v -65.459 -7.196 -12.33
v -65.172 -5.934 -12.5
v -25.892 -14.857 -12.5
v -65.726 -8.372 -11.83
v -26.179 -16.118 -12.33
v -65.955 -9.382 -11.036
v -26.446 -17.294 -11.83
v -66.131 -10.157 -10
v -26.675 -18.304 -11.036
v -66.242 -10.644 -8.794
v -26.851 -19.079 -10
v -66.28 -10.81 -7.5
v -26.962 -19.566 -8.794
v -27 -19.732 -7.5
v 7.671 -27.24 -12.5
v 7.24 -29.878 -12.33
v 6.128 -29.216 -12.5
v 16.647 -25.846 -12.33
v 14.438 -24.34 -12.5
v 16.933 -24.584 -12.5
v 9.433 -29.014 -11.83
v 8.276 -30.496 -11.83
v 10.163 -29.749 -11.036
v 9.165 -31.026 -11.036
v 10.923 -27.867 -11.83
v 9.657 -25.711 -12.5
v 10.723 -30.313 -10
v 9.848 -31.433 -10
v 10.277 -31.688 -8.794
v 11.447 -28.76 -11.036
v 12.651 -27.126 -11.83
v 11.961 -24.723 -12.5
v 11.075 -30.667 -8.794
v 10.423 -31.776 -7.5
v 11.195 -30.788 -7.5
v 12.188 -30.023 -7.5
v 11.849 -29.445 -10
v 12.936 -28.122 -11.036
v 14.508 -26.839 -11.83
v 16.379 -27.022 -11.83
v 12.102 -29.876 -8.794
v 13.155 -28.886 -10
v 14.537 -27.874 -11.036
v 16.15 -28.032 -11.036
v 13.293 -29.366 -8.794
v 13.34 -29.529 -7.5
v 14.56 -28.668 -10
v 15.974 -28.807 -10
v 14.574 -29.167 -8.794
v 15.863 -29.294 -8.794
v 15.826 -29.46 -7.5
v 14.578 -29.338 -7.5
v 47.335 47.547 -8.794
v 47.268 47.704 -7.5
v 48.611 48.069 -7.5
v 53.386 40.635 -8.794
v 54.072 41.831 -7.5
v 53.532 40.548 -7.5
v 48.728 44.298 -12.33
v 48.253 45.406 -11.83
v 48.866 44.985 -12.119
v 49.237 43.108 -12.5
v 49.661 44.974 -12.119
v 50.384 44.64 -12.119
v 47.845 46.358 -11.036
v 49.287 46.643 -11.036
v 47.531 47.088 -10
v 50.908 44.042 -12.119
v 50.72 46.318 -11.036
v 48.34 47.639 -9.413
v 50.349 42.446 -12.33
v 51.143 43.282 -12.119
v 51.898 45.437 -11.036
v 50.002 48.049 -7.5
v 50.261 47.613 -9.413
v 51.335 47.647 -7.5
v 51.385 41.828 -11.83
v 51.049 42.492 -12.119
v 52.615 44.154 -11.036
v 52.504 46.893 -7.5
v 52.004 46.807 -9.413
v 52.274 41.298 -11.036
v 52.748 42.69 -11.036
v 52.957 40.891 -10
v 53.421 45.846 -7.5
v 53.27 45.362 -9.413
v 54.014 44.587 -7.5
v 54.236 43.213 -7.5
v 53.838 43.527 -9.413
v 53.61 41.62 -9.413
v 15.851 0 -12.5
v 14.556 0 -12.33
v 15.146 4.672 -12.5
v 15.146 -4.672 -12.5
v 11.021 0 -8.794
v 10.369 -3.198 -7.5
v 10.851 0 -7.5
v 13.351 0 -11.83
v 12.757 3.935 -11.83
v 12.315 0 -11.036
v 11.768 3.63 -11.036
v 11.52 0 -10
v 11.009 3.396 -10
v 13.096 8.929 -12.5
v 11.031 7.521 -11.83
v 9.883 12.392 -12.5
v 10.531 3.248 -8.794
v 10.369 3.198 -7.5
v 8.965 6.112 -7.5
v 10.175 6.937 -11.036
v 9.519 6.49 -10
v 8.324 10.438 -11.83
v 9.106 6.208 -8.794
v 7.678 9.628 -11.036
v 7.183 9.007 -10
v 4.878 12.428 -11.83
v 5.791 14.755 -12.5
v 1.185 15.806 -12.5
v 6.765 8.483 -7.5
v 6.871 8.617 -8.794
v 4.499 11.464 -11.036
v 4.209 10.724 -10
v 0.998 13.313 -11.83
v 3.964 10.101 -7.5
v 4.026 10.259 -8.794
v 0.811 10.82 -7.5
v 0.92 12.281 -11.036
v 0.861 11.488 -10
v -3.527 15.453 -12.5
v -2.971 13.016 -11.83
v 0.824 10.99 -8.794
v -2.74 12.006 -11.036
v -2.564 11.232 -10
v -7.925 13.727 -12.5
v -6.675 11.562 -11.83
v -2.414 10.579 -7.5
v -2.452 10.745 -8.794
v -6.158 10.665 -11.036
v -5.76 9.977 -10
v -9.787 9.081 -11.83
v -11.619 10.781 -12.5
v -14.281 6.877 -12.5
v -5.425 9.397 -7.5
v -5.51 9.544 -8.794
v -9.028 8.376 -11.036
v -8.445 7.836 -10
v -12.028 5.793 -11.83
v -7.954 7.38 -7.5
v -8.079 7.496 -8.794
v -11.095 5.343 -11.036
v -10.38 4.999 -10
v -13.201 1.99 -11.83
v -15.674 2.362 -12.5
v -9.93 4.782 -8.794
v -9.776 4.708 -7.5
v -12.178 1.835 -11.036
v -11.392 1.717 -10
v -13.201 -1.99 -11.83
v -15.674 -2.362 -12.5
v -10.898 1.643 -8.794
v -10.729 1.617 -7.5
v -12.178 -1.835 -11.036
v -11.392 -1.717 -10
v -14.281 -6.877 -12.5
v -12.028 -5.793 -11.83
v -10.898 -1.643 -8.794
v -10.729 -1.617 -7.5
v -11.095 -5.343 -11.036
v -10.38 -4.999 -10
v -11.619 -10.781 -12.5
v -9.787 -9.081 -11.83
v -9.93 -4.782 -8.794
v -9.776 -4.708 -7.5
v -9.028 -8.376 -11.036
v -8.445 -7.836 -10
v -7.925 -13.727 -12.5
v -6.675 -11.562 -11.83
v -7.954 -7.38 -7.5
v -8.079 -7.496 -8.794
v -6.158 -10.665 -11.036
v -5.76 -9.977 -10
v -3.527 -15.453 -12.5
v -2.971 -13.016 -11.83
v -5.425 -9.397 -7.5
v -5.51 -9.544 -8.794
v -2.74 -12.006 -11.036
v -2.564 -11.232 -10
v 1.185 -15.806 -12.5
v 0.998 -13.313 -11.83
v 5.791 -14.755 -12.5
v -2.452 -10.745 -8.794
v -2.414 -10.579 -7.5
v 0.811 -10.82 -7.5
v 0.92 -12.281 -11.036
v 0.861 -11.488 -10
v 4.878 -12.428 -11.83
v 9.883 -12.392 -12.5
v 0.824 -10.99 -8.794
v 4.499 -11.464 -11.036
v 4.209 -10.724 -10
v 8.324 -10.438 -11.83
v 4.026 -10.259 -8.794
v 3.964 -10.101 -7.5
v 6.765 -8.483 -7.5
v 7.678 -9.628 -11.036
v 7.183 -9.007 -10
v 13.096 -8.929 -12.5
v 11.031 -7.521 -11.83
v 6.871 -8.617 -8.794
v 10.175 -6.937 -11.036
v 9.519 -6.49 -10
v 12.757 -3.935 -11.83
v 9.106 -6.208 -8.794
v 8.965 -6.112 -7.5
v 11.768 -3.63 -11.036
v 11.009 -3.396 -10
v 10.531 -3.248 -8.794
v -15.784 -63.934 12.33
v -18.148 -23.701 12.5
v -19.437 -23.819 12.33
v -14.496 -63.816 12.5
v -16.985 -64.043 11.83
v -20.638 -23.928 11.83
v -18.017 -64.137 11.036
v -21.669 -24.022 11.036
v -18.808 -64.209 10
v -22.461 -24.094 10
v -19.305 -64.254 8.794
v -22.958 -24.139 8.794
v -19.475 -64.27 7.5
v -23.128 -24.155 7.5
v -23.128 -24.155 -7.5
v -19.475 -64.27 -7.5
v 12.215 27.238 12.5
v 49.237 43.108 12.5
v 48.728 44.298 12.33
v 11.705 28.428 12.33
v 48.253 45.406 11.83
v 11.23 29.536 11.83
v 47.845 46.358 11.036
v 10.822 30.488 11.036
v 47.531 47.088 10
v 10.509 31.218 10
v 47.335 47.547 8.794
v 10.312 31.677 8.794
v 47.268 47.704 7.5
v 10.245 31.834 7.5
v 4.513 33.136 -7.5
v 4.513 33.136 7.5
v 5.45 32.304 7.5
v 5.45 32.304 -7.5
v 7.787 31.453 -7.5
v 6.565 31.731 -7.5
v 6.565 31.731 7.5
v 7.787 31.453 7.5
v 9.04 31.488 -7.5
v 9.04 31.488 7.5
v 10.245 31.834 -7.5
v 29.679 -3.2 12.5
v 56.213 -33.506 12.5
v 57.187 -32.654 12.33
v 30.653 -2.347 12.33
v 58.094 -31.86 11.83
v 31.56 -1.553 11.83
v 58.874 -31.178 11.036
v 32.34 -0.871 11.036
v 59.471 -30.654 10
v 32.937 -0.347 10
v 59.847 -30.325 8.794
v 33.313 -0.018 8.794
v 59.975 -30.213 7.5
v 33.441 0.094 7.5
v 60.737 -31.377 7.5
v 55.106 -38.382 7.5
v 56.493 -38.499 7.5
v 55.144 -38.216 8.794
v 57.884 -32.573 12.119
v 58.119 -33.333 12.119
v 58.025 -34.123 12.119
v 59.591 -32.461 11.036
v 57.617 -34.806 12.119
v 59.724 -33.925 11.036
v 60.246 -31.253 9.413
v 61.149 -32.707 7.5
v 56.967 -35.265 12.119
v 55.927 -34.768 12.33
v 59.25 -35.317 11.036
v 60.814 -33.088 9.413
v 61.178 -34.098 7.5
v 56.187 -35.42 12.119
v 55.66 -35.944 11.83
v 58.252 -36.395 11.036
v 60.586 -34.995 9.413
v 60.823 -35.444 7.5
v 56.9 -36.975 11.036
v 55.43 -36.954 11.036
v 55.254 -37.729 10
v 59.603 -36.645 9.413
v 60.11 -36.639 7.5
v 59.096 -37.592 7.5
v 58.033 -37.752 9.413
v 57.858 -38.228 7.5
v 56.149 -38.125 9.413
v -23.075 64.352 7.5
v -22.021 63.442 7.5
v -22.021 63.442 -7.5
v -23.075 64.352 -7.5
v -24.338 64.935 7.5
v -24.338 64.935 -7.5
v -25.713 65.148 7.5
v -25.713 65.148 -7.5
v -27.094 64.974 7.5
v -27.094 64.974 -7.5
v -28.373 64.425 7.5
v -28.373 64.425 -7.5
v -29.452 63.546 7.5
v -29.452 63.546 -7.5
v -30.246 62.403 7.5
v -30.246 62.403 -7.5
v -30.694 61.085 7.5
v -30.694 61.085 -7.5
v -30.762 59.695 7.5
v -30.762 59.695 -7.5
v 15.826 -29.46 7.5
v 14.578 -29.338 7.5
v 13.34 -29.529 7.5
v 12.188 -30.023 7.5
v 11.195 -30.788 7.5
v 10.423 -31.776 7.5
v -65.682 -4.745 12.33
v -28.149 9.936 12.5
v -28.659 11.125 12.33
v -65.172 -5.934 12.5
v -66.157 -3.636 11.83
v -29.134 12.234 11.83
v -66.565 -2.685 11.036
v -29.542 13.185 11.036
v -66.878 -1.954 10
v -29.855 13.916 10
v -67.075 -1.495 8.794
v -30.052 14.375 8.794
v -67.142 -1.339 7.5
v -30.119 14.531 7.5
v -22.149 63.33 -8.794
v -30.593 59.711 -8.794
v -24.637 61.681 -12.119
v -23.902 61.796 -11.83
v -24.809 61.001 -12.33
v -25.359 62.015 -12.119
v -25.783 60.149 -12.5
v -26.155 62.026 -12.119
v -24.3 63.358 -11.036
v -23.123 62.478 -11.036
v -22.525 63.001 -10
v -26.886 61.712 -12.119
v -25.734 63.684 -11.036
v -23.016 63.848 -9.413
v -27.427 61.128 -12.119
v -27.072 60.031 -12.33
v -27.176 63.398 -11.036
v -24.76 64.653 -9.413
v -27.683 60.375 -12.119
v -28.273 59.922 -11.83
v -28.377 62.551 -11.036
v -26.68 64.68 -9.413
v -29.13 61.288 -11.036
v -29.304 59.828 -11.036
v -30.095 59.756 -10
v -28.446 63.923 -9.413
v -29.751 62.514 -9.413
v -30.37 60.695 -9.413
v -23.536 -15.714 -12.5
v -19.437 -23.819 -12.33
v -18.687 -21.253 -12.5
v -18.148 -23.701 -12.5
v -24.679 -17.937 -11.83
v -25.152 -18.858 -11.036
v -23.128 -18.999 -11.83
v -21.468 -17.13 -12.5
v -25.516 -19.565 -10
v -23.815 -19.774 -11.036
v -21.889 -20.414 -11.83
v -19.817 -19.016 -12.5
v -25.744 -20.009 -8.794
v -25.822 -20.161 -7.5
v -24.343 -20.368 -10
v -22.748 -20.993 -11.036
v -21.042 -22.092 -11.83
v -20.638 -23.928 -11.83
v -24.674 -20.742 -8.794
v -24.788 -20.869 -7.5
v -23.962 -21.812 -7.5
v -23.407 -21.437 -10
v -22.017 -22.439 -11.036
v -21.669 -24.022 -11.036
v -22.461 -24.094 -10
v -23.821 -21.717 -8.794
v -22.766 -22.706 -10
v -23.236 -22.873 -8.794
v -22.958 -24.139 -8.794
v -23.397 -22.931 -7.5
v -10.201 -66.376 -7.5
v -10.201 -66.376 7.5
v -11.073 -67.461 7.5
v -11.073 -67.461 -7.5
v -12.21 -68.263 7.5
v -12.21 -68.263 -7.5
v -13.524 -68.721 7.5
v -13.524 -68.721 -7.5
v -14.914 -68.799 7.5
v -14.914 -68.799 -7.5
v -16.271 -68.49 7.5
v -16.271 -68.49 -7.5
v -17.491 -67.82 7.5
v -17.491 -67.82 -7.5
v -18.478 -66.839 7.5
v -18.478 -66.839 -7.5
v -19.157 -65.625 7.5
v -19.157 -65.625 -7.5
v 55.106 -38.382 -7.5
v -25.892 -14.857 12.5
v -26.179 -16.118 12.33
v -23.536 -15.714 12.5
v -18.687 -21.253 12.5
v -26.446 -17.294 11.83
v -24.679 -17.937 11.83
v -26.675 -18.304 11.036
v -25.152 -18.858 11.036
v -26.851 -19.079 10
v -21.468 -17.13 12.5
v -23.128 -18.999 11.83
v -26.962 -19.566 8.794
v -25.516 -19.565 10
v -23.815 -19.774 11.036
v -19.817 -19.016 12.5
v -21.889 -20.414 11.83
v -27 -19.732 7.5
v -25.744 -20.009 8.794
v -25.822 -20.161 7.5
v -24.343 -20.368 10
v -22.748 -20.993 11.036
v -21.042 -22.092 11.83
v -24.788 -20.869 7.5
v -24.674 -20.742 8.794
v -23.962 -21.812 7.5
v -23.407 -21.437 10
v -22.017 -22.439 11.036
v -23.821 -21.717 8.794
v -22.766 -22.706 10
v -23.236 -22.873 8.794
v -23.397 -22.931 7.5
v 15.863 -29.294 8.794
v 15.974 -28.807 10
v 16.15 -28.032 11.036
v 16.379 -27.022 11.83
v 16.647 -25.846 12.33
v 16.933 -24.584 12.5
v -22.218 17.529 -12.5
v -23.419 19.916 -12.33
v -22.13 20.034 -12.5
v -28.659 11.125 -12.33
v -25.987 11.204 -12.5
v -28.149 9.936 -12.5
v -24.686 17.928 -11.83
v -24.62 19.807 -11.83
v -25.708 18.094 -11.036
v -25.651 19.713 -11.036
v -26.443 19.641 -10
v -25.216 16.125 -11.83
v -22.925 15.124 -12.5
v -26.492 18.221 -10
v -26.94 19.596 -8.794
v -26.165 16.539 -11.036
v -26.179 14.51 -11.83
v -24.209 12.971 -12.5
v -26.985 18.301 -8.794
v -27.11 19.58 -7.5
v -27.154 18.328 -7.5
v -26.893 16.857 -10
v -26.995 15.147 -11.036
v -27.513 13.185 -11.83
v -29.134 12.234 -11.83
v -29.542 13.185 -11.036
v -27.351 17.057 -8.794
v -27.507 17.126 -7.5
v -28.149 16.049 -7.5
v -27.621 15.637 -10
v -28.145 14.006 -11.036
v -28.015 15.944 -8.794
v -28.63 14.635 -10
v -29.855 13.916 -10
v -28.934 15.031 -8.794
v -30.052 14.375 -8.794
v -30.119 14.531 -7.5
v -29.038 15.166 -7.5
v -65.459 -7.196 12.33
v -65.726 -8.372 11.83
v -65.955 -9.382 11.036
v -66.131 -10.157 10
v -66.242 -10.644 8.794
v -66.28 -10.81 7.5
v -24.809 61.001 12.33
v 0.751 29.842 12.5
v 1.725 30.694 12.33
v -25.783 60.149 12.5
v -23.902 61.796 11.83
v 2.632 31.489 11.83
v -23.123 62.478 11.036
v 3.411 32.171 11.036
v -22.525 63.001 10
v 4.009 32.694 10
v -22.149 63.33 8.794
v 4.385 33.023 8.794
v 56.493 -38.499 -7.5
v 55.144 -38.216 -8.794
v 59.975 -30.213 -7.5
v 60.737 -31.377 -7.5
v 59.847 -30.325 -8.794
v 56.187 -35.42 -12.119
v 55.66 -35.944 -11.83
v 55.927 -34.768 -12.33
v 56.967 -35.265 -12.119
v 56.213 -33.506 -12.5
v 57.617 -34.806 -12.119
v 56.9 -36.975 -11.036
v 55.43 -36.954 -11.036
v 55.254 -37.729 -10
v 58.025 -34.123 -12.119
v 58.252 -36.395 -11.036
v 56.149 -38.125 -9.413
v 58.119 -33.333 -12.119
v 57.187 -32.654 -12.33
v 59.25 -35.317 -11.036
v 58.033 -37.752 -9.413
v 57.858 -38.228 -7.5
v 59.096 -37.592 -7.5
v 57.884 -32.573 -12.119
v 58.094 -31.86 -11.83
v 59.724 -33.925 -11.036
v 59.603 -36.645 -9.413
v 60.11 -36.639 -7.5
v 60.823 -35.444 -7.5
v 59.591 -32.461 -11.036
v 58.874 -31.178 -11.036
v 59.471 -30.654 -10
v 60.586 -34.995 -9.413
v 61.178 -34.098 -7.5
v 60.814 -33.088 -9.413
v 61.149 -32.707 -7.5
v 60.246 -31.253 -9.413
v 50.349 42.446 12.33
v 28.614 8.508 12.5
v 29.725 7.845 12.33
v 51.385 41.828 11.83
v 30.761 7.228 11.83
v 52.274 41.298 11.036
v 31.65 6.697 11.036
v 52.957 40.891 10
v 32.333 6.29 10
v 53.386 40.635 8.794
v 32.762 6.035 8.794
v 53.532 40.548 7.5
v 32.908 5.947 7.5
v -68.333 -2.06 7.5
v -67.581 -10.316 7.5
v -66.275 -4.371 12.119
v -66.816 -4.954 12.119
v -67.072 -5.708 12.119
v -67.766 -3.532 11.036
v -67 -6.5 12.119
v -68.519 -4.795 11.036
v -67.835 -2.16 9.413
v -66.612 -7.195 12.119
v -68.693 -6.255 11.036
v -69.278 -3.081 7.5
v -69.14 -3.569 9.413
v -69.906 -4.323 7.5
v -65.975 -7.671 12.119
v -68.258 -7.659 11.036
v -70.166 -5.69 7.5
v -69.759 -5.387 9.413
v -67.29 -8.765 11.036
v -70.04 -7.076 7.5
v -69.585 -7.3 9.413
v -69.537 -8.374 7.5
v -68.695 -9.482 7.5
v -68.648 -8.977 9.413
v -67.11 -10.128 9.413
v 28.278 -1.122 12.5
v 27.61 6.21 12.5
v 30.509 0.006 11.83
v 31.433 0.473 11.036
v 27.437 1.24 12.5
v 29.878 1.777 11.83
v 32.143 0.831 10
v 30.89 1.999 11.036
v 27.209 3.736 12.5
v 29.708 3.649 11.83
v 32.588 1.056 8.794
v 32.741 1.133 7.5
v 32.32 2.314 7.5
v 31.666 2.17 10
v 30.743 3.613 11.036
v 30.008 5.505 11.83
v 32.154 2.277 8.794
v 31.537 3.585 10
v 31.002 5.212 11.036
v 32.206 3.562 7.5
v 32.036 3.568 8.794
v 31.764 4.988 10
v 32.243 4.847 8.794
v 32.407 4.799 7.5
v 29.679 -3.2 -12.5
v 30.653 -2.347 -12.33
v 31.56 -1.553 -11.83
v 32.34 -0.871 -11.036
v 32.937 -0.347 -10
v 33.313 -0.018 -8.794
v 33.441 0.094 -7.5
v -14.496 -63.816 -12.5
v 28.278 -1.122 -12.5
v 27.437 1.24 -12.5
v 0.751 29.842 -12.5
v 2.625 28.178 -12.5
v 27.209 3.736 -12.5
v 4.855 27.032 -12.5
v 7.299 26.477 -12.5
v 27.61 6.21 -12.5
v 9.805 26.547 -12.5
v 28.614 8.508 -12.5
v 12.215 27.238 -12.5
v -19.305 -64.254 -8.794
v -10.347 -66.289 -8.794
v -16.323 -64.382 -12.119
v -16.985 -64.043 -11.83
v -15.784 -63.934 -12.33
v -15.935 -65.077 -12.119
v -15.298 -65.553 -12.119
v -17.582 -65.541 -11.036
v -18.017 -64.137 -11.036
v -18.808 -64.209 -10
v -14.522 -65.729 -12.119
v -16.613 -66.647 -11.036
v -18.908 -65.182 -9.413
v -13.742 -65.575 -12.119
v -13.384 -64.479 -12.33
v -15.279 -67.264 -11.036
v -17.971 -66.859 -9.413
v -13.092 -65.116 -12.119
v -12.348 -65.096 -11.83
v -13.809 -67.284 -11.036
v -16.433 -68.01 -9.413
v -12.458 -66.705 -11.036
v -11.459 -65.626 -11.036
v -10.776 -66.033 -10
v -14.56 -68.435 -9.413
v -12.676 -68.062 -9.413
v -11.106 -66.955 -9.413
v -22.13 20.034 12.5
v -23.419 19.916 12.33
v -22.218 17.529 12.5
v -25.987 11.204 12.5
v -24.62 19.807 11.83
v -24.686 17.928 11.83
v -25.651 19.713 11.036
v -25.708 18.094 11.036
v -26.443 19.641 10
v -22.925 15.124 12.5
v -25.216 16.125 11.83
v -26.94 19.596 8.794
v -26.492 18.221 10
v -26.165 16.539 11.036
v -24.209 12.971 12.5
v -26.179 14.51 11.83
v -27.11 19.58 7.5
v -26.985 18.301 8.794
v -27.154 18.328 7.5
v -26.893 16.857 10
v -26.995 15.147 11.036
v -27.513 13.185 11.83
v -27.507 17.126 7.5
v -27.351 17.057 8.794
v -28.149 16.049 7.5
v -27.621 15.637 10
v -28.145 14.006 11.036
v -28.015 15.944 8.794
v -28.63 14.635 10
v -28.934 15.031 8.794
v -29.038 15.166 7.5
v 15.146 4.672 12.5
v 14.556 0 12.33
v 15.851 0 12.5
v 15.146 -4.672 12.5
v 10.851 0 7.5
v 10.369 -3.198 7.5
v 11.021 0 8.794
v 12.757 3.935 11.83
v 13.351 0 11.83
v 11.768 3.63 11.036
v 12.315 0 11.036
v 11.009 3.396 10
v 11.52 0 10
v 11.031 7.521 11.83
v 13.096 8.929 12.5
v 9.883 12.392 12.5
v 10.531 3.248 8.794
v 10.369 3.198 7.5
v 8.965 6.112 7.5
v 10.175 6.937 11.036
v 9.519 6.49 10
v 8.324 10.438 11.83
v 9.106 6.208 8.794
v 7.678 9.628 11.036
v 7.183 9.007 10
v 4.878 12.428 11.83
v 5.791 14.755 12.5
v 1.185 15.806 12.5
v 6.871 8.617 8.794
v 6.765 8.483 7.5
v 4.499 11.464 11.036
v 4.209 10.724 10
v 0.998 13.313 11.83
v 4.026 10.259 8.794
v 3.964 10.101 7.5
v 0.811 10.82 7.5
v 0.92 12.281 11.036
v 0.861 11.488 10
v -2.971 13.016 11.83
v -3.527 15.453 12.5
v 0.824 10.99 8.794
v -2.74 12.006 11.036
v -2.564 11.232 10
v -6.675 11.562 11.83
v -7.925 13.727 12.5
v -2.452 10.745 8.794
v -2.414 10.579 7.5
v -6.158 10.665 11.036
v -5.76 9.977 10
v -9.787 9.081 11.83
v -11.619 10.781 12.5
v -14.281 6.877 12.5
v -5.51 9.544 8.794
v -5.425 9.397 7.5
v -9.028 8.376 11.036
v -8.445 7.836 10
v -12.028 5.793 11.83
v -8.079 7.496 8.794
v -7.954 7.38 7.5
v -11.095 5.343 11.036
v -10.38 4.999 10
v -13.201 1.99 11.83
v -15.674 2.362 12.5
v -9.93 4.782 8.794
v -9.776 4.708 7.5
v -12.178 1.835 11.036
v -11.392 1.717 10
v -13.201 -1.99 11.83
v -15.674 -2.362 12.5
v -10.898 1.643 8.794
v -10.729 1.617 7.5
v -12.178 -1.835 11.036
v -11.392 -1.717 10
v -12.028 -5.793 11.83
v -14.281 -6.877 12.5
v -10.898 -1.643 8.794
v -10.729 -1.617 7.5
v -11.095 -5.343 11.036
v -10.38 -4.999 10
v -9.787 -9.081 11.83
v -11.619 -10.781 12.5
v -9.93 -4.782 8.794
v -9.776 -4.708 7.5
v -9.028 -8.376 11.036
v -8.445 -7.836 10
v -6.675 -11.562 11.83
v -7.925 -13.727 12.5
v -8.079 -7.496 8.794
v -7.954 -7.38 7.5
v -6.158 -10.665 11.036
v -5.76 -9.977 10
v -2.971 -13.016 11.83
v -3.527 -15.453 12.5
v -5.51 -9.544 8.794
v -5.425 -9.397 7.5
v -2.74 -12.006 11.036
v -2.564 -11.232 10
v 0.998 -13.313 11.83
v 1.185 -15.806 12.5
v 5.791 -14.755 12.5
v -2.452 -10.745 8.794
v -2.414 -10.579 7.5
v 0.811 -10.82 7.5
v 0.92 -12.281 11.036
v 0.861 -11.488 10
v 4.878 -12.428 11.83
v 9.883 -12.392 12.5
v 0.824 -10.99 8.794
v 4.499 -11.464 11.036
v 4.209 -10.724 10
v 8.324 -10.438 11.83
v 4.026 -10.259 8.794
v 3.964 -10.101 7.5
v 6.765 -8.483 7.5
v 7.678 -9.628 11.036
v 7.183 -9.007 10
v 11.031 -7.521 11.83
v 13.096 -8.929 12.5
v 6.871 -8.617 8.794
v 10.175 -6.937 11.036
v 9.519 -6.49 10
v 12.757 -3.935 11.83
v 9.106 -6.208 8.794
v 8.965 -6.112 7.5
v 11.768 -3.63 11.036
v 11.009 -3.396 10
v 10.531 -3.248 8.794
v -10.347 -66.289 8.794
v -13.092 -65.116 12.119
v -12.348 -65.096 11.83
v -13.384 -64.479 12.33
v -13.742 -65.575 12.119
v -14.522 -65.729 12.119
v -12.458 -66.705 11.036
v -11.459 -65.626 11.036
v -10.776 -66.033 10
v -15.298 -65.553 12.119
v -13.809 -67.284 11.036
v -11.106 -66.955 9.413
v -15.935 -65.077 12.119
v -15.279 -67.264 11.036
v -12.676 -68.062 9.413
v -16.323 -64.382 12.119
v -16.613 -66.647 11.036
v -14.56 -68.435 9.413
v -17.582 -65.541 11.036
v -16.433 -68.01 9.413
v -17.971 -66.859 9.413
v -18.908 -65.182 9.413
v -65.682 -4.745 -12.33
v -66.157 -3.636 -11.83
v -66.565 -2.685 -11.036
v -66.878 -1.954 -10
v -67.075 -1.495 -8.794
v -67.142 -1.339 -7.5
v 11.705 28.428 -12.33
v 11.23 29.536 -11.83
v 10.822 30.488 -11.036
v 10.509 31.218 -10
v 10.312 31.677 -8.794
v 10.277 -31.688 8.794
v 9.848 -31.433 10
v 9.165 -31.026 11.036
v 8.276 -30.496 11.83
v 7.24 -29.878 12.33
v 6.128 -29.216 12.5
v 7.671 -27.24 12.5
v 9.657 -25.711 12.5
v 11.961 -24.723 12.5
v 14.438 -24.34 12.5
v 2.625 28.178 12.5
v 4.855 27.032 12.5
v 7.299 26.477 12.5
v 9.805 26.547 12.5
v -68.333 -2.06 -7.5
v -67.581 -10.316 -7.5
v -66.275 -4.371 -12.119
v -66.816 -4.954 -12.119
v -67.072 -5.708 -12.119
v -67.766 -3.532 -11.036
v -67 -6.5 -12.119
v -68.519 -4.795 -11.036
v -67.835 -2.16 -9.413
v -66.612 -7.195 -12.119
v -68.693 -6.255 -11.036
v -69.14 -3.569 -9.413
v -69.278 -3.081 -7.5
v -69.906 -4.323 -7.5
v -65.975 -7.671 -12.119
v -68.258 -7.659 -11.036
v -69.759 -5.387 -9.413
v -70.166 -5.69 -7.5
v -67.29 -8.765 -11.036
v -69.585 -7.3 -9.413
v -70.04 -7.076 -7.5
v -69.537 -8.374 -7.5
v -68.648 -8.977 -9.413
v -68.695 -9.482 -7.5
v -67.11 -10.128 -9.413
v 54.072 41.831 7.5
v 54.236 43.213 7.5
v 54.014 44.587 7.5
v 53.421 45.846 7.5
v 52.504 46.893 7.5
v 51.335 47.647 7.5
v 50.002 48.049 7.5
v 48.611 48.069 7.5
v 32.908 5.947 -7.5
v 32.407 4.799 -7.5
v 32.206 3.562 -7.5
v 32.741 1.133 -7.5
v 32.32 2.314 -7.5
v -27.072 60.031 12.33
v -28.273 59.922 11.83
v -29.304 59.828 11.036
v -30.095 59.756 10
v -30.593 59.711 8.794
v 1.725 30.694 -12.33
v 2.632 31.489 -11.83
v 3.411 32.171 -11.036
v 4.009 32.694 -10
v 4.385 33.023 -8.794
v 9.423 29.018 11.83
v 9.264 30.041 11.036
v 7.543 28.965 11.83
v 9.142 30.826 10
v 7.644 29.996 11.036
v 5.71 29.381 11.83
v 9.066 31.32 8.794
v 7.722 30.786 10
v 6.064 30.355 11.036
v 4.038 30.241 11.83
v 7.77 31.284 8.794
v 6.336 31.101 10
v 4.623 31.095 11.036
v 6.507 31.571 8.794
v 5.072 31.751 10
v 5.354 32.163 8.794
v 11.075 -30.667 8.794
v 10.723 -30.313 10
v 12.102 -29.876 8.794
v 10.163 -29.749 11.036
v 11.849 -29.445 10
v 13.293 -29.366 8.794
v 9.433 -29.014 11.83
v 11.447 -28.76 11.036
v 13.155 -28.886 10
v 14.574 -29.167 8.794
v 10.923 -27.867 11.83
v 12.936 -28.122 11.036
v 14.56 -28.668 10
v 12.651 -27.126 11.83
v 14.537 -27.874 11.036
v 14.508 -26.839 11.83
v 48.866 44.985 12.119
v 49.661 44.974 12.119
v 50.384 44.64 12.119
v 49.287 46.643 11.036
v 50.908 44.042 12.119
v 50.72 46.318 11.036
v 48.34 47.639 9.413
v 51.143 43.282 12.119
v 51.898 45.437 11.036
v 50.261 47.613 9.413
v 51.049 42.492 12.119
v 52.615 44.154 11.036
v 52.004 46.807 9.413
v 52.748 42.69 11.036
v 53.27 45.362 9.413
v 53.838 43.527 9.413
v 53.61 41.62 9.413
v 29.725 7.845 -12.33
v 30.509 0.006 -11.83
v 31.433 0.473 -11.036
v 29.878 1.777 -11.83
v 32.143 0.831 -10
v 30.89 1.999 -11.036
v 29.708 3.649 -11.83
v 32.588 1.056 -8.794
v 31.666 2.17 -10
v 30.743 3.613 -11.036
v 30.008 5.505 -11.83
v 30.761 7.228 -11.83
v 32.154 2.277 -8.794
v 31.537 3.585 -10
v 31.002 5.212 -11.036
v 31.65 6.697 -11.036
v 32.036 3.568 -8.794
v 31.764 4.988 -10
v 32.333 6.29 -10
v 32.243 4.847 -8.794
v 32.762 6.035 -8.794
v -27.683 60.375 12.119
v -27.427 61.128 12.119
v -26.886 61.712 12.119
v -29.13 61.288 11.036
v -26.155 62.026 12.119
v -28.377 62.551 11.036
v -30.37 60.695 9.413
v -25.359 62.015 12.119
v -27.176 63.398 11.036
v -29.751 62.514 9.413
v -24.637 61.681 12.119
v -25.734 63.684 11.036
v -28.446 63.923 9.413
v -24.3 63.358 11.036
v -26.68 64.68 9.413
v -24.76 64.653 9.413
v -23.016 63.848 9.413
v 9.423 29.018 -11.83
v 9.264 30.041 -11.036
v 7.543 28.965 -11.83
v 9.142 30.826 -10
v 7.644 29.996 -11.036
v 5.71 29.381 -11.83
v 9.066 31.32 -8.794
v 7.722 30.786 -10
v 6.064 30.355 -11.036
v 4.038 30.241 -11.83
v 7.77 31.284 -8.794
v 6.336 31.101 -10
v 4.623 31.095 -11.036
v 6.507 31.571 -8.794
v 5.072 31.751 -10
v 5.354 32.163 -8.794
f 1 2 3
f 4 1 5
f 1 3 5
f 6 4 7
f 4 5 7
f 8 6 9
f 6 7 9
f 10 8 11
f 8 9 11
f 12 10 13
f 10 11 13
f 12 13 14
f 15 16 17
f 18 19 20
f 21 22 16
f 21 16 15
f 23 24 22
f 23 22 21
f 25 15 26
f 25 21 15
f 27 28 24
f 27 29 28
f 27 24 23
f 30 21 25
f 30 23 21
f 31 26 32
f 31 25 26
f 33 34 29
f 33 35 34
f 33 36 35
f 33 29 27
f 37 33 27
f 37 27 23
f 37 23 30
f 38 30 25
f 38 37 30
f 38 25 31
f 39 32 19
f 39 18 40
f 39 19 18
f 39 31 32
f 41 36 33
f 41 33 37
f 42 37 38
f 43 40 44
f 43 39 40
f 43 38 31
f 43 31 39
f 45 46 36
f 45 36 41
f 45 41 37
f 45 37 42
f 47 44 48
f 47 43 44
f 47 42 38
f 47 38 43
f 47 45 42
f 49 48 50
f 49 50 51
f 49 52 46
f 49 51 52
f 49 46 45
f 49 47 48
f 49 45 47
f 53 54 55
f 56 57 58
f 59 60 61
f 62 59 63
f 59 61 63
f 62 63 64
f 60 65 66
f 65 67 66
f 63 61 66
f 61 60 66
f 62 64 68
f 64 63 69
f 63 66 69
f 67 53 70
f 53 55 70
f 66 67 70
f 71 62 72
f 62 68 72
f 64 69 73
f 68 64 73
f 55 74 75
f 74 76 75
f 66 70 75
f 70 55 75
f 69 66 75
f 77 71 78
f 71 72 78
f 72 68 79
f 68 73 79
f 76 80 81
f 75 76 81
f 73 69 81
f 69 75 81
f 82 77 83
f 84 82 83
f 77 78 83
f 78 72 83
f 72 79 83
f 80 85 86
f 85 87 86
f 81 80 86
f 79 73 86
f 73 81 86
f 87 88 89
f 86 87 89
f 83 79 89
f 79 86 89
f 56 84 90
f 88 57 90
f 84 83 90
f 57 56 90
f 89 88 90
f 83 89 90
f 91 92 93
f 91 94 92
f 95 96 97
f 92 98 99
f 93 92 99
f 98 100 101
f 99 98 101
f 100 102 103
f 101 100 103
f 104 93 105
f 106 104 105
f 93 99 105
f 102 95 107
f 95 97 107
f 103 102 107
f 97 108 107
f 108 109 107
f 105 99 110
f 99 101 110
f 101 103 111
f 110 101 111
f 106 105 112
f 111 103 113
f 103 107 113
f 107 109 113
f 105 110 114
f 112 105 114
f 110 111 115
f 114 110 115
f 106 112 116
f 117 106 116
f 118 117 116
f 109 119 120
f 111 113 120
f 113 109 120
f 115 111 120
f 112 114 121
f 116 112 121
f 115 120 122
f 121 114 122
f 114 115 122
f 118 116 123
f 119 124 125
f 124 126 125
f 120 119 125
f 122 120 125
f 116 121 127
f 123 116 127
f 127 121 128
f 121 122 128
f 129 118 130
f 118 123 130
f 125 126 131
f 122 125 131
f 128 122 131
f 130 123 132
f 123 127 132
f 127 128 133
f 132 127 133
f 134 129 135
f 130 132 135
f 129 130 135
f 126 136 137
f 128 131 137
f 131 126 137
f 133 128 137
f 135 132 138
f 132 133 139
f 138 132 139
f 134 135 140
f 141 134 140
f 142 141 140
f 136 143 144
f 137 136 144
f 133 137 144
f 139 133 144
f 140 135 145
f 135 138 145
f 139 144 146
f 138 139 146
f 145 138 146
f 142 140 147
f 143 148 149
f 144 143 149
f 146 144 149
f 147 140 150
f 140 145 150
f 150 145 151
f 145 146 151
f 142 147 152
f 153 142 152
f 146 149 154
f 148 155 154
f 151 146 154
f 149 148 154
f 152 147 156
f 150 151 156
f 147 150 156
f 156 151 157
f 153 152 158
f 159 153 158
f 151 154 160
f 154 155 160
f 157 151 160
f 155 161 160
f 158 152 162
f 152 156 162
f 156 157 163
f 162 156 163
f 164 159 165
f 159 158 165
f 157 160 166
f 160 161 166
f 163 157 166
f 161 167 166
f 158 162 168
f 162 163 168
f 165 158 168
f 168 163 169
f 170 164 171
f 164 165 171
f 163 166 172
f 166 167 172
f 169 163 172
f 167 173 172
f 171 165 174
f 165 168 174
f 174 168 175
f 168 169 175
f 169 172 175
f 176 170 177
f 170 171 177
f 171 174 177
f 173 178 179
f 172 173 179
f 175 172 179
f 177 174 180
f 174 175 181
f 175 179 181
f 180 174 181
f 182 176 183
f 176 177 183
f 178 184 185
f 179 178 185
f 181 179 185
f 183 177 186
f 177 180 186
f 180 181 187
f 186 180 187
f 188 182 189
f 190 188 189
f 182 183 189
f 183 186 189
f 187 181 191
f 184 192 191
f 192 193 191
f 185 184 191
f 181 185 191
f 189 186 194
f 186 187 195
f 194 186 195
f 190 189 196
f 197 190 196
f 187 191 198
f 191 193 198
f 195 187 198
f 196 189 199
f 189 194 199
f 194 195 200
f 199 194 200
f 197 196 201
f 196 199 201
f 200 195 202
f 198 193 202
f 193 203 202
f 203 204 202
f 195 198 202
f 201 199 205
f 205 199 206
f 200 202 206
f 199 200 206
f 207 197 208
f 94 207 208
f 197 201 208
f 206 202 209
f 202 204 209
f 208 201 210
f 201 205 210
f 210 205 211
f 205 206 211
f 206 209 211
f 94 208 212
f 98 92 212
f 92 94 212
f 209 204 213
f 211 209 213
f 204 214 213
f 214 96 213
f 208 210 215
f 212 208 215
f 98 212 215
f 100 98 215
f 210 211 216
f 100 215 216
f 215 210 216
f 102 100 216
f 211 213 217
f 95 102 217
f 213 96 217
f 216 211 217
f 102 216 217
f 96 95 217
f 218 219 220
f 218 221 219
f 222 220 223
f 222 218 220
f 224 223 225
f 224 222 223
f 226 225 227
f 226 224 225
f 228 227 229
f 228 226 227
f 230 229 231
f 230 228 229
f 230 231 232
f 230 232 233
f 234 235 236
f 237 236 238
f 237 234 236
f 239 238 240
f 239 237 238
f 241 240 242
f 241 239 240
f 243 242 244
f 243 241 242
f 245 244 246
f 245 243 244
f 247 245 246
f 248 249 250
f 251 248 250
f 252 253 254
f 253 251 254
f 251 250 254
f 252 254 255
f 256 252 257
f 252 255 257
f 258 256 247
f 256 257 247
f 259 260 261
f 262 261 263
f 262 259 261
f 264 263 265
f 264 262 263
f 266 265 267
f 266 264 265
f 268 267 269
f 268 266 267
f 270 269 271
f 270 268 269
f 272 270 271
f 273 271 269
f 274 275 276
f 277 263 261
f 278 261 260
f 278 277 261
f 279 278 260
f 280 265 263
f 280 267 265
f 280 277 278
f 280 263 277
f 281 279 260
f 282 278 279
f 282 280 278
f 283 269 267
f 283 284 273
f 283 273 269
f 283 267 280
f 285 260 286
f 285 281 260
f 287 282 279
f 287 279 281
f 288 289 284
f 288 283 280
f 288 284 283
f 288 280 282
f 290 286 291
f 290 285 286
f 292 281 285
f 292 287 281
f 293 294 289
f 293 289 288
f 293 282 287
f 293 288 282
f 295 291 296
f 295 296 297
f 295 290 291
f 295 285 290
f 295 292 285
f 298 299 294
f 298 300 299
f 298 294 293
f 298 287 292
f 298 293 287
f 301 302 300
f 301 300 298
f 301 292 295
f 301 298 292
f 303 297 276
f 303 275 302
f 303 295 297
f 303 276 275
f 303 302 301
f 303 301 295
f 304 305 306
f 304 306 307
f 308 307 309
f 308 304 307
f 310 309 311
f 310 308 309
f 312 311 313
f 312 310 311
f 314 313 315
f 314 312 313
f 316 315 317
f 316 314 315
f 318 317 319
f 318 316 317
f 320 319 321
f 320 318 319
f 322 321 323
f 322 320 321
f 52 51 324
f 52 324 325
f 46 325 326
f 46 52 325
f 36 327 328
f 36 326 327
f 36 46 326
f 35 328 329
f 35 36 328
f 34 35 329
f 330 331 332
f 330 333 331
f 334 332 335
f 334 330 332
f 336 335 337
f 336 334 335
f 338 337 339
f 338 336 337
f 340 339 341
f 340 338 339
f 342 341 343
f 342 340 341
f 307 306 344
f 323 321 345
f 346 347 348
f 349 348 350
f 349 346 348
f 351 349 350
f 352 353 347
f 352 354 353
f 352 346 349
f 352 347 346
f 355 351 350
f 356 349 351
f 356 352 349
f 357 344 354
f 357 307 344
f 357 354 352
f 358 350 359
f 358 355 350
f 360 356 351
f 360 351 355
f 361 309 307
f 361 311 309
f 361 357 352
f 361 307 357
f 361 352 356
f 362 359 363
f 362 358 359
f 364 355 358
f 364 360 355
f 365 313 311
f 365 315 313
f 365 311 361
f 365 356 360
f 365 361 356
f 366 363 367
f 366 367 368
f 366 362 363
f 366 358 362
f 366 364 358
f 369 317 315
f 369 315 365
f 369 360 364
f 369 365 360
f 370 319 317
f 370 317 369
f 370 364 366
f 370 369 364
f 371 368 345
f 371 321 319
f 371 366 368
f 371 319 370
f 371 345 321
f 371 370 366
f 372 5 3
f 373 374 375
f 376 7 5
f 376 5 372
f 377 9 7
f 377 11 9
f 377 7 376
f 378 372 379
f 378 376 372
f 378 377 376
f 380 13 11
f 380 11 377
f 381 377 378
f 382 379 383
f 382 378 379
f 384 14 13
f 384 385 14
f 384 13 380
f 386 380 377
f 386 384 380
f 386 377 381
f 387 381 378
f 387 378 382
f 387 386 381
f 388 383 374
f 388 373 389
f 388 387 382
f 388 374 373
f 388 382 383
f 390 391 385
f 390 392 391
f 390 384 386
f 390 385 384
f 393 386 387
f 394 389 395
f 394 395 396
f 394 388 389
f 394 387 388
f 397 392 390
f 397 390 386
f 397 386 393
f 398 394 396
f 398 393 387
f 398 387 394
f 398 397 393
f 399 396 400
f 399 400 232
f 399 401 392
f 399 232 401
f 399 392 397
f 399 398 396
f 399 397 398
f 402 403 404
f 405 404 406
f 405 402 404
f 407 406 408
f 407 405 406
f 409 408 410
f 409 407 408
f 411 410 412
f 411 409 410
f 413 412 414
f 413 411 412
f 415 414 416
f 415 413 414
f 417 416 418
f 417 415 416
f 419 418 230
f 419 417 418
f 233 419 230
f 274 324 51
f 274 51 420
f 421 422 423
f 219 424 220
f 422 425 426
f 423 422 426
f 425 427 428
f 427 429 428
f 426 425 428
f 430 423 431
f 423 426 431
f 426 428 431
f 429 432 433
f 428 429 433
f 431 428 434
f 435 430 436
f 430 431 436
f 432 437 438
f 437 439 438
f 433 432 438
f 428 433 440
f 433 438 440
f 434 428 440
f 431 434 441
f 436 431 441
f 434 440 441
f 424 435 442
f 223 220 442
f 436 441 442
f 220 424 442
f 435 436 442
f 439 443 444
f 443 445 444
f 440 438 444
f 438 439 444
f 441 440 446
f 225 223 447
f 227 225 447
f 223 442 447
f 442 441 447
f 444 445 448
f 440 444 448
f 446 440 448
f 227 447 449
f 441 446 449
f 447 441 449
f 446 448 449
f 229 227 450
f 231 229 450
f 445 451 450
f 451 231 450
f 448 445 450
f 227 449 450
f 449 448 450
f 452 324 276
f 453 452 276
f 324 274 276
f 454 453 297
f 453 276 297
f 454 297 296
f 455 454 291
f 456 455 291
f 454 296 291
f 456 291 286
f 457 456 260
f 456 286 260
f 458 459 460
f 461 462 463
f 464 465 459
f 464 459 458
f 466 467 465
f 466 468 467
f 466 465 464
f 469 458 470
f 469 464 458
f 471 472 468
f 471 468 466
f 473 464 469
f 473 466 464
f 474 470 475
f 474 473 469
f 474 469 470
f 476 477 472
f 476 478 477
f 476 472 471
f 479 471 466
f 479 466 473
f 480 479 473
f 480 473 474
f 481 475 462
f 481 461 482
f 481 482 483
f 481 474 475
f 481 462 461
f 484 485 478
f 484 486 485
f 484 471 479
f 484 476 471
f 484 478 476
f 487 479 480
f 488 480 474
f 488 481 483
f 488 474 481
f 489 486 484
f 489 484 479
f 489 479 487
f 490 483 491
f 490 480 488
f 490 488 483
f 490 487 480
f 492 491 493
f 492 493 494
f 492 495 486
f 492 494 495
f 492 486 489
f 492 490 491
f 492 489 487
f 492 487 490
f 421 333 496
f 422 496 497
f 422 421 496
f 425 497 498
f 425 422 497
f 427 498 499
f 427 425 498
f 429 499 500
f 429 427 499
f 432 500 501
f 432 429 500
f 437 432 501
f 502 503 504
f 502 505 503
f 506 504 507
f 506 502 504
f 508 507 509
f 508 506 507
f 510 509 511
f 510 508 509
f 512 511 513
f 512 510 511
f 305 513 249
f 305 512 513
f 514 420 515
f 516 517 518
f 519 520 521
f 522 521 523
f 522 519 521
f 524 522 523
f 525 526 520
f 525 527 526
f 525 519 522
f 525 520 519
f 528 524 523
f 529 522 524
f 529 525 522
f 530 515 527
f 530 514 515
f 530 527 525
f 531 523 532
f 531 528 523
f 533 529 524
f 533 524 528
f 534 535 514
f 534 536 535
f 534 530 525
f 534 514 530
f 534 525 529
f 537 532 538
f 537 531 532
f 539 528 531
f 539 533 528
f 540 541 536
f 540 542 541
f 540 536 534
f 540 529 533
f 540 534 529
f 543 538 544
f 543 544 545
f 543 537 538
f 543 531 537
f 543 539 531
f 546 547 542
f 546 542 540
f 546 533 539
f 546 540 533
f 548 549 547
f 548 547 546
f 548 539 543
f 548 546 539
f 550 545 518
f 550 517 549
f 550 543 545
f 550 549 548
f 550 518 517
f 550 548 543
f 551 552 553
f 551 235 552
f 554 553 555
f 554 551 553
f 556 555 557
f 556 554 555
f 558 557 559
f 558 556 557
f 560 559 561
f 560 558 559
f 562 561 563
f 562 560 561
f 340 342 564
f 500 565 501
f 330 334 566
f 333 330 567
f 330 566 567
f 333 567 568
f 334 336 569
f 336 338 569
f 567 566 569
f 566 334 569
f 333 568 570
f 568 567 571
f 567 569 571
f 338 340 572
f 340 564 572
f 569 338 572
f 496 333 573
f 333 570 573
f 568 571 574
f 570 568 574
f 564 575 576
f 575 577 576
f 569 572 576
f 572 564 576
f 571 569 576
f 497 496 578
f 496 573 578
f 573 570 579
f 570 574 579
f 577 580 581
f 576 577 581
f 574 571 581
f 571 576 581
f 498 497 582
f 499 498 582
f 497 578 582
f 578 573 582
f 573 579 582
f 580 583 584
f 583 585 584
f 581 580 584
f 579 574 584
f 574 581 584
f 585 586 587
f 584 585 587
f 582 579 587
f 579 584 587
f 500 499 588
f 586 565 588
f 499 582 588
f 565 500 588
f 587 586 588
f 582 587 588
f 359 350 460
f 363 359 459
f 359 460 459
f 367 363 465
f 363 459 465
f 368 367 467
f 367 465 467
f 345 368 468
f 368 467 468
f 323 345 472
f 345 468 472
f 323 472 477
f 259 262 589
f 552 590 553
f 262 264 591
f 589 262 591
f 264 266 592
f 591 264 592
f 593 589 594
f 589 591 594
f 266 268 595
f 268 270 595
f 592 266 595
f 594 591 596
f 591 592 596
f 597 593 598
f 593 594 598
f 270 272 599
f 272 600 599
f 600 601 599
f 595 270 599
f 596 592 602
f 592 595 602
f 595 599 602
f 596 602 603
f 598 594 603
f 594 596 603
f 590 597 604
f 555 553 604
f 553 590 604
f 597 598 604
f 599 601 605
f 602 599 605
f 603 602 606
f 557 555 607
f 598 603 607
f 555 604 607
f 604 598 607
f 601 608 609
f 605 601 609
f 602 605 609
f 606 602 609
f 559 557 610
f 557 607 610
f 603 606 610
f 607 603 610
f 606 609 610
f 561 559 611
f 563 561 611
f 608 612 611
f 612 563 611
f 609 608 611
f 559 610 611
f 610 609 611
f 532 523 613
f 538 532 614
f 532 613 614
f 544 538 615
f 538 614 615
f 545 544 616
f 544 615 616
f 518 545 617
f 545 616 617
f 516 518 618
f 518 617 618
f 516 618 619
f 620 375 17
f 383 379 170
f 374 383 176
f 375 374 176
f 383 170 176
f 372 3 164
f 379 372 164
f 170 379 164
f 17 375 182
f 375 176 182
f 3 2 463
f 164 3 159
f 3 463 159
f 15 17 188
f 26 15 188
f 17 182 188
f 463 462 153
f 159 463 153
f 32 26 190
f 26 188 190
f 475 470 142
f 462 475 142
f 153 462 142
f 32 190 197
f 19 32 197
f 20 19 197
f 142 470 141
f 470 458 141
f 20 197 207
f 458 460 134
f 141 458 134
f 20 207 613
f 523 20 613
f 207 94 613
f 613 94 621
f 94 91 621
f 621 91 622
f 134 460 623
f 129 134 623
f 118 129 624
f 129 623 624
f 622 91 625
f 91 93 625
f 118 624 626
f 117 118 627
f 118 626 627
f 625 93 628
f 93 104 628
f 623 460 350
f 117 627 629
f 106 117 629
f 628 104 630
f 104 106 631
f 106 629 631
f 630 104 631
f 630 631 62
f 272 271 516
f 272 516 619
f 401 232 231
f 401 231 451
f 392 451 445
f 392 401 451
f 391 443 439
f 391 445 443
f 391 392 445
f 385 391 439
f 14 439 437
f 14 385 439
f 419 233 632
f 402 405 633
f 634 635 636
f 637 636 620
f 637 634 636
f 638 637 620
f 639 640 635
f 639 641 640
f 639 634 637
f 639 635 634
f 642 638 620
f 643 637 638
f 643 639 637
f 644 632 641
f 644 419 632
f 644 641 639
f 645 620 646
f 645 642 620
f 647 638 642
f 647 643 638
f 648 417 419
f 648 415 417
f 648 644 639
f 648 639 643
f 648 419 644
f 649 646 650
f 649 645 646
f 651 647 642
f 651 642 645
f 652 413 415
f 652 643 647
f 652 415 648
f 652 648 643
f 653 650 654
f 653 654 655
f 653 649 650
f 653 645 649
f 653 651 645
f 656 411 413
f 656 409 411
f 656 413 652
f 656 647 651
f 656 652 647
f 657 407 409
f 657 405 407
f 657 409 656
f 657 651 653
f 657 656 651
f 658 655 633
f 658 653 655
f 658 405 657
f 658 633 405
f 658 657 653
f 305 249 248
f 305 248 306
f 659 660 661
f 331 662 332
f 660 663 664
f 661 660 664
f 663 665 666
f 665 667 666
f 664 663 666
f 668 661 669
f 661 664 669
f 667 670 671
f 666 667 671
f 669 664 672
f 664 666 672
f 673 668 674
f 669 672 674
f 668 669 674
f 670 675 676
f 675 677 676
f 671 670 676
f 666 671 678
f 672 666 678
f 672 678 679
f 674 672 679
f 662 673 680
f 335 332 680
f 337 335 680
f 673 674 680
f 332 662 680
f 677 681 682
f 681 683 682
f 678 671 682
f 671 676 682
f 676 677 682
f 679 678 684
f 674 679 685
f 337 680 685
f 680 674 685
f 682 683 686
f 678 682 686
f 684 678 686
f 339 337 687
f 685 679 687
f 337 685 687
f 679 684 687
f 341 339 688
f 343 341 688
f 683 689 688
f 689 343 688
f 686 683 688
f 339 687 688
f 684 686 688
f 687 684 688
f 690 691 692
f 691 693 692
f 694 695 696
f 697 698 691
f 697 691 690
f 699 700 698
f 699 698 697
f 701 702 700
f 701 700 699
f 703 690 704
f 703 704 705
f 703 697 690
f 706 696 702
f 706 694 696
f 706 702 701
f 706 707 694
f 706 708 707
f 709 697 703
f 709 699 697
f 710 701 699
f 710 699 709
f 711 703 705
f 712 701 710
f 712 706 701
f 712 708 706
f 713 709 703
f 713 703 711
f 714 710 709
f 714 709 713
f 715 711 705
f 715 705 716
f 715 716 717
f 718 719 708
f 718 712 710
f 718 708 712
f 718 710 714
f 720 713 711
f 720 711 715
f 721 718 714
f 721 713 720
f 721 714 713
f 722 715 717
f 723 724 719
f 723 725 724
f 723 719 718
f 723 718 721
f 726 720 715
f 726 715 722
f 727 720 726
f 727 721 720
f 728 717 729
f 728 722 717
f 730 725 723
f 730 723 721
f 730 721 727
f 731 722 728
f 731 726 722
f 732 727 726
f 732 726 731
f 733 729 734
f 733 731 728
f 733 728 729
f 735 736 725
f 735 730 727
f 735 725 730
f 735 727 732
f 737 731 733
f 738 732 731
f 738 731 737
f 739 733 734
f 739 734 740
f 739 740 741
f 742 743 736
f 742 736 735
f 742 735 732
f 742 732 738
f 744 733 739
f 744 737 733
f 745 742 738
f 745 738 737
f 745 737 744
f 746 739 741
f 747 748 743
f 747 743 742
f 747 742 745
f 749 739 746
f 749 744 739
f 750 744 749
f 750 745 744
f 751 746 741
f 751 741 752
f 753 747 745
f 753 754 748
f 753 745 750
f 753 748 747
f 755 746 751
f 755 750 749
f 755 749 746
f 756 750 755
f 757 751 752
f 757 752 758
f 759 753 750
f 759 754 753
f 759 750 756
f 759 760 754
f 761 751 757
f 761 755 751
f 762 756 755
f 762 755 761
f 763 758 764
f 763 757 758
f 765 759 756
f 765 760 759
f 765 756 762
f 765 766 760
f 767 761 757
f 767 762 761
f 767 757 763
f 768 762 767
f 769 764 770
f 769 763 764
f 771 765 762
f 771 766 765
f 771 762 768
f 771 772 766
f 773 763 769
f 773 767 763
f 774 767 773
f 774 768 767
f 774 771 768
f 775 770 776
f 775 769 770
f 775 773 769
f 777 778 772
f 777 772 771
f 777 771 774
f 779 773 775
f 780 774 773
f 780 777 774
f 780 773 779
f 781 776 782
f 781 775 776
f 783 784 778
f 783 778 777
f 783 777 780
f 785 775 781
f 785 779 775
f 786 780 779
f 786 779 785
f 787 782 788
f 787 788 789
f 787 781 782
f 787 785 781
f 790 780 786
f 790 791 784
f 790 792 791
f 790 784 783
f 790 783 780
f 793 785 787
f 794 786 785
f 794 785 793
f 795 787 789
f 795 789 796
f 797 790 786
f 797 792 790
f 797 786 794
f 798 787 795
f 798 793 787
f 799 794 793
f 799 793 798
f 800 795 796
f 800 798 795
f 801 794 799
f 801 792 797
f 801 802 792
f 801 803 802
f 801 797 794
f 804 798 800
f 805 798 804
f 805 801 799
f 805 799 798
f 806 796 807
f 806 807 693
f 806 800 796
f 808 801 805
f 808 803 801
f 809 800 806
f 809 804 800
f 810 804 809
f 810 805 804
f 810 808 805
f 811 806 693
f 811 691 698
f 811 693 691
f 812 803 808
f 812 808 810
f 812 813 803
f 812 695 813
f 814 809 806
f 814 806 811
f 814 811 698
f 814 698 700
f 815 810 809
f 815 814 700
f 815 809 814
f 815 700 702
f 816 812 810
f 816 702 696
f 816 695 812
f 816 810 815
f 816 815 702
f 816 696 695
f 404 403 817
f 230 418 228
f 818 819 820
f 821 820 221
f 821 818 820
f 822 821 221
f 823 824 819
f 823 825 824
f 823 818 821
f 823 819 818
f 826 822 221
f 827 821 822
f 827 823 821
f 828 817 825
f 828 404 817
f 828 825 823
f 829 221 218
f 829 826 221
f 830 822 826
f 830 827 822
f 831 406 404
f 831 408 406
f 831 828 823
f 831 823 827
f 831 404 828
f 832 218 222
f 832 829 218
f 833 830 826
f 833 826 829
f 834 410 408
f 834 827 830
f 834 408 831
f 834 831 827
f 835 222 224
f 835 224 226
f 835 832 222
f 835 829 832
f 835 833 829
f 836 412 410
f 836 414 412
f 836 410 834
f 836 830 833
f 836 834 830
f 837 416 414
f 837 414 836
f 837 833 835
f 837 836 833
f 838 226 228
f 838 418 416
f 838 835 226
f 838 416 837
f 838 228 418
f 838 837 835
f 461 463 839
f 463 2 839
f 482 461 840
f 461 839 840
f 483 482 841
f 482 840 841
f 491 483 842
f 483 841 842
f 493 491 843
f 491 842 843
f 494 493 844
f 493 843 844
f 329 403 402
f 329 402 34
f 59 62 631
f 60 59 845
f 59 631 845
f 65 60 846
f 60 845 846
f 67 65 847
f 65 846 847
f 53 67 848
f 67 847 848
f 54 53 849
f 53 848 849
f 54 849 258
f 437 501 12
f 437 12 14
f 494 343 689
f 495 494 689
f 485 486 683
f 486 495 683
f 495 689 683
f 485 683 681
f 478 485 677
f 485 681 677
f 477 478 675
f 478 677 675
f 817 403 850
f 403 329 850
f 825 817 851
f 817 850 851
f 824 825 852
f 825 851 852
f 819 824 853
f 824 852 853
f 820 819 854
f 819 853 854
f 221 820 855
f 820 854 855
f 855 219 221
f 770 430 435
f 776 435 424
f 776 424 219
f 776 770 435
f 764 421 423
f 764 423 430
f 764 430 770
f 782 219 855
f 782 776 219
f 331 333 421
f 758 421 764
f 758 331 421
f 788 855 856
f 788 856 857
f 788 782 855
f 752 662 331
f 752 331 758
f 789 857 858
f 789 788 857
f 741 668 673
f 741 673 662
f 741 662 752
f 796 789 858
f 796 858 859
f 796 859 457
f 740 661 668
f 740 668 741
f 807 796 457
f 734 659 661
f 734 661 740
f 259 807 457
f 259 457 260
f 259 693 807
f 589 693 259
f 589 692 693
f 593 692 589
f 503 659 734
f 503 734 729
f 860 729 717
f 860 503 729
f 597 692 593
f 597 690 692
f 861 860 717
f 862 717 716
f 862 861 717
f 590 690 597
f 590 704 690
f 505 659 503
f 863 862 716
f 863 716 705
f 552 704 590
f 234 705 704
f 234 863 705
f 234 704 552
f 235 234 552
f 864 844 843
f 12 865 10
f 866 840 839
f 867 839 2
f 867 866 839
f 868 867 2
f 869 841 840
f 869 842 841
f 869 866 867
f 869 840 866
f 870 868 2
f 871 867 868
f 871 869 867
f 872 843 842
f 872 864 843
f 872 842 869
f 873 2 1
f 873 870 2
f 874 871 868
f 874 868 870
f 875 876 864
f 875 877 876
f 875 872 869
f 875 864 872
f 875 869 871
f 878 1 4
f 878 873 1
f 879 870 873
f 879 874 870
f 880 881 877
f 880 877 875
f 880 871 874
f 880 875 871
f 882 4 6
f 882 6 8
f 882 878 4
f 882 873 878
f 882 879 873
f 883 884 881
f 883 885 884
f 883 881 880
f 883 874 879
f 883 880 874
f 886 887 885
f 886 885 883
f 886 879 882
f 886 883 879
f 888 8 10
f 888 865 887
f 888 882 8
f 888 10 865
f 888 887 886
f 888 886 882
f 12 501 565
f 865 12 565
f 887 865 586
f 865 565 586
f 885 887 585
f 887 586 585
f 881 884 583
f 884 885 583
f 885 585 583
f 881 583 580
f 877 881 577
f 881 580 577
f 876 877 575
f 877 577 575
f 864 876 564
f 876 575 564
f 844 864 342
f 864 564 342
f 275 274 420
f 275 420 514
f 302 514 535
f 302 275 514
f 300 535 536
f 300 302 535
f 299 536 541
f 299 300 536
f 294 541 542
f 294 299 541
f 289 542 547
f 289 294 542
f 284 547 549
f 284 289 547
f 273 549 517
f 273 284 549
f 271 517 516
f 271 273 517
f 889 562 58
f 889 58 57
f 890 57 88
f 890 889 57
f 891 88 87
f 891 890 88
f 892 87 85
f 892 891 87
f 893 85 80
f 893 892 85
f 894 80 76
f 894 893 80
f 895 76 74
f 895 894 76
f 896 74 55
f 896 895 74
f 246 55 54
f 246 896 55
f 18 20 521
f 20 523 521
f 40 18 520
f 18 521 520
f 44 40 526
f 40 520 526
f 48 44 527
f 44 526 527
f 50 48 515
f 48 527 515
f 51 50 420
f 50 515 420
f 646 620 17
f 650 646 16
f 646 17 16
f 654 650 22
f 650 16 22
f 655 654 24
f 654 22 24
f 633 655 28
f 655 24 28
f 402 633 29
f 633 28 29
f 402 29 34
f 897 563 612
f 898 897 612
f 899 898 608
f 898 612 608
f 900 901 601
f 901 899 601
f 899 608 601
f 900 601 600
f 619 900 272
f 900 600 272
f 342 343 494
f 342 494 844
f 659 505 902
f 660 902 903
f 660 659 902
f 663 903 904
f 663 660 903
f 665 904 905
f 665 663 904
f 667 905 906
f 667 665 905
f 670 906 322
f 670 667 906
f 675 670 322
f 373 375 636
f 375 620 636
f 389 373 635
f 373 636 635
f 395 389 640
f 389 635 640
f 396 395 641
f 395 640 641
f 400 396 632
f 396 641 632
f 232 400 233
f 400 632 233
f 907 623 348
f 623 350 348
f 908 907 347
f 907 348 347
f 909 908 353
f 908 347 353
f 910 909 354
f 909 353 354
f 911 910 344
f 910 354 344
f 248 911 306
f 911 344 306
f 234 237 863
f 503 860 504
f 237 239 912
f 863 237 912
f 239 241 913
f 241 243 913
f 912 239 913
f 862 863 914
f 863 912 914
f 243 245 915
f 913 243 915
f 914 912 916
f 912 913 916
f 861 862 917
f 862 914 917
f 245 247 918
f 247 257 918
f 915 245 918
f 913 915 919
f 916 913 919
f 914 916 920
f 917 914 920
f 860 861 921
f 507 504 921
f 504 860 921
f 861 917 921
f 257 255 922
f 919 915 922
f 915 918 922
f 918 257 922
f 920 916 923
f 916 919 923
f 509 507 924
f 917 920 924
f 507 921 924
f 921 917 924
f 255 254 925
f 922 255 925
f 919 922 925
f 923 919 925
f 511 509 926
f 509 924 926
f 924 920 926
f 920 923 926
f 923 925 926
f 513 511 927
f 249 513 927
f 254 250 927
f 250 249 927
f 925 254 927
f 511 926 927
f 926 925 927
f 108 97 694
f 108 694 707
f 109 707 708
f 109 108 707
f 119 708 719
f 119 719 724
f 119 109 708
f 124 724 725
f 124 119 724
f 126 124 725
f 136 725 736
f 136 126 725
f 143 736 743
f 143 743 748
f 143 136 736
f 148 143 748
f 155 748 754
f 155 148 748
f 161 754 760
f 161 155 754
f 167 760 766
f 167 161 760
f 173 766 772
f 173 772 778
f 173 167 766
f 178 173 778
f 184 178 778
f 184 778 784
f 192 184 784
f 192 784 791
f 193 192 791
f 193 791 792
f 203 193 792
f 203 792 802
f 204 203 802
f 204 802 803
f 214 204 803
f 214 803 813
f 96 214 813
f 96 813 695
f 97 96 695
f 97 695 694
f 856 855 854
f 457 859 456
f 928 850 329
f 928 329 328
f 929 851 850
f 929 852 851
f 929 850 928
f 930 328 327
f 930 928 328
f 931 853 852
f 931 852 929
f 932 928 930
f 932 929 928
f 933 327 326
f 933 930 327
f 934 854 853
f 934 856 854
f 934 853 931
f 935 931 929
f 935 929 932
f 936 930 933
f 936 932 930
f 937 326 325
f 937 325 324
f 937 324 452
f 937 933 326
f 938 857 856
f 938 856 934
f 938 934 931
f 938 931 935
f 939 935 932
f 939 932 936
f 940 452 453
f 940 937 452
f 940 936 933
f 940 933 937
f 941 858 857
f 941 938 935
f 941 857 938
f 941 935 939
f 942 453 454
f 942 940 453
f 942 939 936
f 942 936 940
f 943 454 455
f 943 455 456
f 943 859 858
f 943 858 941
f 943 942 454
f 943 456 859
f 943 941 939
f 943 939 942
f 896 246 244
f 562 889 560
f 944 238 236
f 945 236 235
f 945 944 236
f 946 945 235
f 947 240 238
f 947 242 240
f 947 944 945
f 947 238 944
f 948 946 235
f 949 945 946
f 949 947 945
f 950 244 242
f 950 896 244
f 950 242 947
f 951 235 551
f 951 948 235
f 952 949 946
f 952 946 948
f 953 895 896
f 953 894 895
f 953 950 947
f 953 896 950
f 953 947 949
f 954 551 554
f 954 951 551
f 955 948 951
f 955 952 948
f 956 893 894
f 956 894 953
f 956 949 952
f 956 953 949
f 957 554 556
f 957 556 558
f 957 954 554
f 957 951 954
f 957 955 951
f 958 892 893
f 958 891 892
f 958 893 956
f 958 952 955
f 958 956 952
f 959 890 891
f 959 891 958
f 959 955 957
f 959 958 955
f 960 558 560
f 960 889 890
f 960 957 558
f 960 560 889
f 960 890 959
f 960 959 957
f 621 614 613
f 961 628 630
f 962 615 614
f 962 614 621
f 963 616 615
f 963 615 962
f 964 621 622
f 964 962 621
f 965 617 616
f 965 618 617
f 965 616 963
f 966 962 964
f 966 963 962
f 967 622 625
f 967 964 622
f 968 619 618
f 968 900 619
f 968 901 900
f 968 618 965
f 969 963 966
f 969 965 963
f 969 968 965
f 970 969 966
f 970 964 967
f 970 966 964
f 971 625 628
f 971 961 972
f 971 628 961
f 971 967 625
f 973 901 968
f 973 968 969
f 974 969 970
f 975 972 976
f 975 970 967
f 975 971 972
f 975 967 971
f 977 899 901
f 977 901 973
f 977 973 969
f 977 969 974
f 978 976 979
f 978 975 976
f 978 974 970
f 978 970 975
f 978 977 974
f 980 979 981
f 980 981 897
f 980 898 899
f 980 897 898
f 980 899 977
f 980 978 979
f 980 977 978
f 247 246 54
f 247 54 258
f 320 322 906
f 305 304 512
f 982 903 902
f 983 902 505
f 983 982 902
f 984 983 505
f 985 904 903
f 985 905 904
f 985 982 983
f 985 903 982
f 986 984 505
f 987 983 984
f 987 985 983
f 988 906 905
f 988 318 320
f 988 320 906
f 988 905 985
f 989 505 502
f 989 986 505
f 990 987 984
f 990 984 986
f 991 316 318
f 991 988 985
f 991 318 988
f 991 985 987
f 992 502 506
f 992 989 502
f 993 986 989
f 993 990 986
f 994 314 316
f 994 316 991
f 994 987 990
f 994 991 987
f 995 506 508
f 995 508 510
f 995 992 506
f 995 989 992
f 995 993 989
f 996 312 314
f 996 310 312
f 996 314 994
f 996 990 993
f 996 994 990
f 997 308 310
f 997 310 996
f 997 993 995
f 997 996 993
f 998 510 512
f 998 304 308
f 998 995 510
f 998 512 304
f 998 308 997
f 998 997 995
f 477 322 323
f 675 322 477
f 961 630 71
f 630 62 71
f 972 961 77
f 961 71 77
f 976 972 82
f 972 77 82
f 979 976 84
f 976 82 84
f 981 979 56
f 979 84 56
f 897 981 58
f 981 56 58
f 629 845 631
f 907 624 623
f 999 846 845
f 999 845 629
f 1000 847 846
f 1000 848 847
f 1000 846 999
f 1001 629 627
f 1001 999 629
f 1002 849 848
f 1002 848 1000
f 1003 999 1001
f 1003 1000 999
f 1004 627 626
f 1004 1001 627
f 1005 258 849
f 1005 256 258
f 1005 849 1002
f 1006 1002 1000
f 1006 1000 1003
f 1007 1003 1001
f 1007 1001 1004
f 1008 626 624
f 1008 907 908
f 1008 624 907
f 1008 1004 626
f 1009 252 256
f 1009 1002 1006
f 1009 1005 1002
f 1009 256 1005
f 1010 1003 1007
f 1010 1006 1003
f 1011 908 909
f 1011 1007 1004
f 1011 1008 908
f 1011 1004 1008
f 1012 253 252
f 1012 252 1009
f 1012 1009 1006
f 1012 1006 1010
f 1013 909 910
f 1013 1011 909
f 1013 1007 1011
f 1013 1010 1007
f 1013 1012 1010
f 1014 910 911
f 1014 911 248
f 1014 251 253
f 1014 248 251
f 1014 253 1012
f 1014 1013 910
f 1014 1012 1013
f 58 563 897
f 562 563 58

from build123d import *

# Parameters (mm, degrees)
F0_R     = 10.8505850545
F1_DEPTH = 12.5
F2_F1_R  = 5
F2_F2_R  = 5


with BuildPart() as f1:
    # F0 (on Top) → F1 (new body, symmetric)
    with BuildSketch(Plane.XY):
        Polygon((12.2831904488, -28.6552355439), (70.1120882045, -41.7908763236), (31.0484630838, 2.8270535563), align=None)
        Polygon((-18.079658483, -79.5946493517), (12.2831904488, -28.6552355439), (-23.4570338962, -20.5369630781), align=None)
        Polygon((-23.4570338962, -20.5369630781), (12.2831904488, -28.6552355439), (31.0484630838, 2.8270535563), (6.9058150355, 30.4024507297), (-26.7804346719, 15.962694336), align=None)
        Circle(F0_R, mode=Mode.SUBTRACT)
        Polygon((6.9058150355, 30.4024507297), (31.0484630838, 2.8270535563), (61.4113120156, 53.7664673641), align=None)
        Polygon((-81.2859316519, -7.4013222984), (-23.4570338962, -20.5369630781), (-26.7804346719, 15.962694336), align=None)
        Polygon((-26.7804346719, 15.962694336), (6.9058150355, 30.4024507297), (-32.1578100851, 75.0203806096), align=None)
    extrude(amount=F1_DEPTH, both=True)

    # F2: fillet of radius 5 on 22 edges, made by hand

    # F2_f1
    f2_f1_edges = [f1.edges().sort_by_distance(p)[0] for p in [
        (-23.4570338962, -20.5369630781, 0),
        (12.2831904488, -28.6552355439, 0),
        (31.0484630838, 2.8270535563, 0),
        (6.9058150355, 30.4024507297, 0),
        (-26.7804346719, 15.962694336, 0),
    ]]
    fillet(f2_f1_edges, radius=F2_F1_R)

    # F2_f2
    f2_f2_edges = [f1.edges().sort_by_distance(p)[0] for p in [
        (-81.2859316519, -7.4013222984, 0),
        (-18.079658483, -79.5946493517, 0),
        (70.1120882045, -41.7908763236, 0),
        (61.4113120156, 53.7664673641, 0),
        (-32.1578100851, 75.0203806096, 0),
        (-29.6338256066, 47.3004109145, 12.5),
        (-13.8224743676, 54.0780148962, 12.5),
        (47.1598689714, 29.8569799436, 12.5),
        (42.9688762969, -35.6253864896, 12.5),
        (-54.1427197444, -13.5668121324, 12.5),
        (-13.8224743676, 54.0780148962, -12.5),
        (-29.6338256066, 47.3004109145, -12.5),
        (-54.1427197444, -13.5668121324, -12.5),
        (-3.8282154389, -55.6851619313, -12.5),
        (51.7767524869, -20.8485106102, -12.5),
        (-10.8505850545, 0, 12.5),
        (-10.8505850545, 0, -12.5),
        (32.2239403022, 2.9340842019, -12.5),
        (12.7482250787, -29.7401065238, -12.5),
        (-24.3451039073, -21.3144808627, -12.5),
        (-27.7943267531, 16.5670328981, -12.5),
        (7.1672652795, 31.5534702865, -12.5),
        (-24.3451039073, -21.3144808627, 12.5),
        (12.7482250787, -29.7401065238, 12.5),
        (32.2239403022, 2.9340842019, 12.5),
        (7.1672652795, 31.5534702865, 12.5),
        (-27.7943267531, 16.5670328981, 12.5),
    ]]
    fillet(f2_f2_edges, radius=F2_F2_R)


solid = f1.part
